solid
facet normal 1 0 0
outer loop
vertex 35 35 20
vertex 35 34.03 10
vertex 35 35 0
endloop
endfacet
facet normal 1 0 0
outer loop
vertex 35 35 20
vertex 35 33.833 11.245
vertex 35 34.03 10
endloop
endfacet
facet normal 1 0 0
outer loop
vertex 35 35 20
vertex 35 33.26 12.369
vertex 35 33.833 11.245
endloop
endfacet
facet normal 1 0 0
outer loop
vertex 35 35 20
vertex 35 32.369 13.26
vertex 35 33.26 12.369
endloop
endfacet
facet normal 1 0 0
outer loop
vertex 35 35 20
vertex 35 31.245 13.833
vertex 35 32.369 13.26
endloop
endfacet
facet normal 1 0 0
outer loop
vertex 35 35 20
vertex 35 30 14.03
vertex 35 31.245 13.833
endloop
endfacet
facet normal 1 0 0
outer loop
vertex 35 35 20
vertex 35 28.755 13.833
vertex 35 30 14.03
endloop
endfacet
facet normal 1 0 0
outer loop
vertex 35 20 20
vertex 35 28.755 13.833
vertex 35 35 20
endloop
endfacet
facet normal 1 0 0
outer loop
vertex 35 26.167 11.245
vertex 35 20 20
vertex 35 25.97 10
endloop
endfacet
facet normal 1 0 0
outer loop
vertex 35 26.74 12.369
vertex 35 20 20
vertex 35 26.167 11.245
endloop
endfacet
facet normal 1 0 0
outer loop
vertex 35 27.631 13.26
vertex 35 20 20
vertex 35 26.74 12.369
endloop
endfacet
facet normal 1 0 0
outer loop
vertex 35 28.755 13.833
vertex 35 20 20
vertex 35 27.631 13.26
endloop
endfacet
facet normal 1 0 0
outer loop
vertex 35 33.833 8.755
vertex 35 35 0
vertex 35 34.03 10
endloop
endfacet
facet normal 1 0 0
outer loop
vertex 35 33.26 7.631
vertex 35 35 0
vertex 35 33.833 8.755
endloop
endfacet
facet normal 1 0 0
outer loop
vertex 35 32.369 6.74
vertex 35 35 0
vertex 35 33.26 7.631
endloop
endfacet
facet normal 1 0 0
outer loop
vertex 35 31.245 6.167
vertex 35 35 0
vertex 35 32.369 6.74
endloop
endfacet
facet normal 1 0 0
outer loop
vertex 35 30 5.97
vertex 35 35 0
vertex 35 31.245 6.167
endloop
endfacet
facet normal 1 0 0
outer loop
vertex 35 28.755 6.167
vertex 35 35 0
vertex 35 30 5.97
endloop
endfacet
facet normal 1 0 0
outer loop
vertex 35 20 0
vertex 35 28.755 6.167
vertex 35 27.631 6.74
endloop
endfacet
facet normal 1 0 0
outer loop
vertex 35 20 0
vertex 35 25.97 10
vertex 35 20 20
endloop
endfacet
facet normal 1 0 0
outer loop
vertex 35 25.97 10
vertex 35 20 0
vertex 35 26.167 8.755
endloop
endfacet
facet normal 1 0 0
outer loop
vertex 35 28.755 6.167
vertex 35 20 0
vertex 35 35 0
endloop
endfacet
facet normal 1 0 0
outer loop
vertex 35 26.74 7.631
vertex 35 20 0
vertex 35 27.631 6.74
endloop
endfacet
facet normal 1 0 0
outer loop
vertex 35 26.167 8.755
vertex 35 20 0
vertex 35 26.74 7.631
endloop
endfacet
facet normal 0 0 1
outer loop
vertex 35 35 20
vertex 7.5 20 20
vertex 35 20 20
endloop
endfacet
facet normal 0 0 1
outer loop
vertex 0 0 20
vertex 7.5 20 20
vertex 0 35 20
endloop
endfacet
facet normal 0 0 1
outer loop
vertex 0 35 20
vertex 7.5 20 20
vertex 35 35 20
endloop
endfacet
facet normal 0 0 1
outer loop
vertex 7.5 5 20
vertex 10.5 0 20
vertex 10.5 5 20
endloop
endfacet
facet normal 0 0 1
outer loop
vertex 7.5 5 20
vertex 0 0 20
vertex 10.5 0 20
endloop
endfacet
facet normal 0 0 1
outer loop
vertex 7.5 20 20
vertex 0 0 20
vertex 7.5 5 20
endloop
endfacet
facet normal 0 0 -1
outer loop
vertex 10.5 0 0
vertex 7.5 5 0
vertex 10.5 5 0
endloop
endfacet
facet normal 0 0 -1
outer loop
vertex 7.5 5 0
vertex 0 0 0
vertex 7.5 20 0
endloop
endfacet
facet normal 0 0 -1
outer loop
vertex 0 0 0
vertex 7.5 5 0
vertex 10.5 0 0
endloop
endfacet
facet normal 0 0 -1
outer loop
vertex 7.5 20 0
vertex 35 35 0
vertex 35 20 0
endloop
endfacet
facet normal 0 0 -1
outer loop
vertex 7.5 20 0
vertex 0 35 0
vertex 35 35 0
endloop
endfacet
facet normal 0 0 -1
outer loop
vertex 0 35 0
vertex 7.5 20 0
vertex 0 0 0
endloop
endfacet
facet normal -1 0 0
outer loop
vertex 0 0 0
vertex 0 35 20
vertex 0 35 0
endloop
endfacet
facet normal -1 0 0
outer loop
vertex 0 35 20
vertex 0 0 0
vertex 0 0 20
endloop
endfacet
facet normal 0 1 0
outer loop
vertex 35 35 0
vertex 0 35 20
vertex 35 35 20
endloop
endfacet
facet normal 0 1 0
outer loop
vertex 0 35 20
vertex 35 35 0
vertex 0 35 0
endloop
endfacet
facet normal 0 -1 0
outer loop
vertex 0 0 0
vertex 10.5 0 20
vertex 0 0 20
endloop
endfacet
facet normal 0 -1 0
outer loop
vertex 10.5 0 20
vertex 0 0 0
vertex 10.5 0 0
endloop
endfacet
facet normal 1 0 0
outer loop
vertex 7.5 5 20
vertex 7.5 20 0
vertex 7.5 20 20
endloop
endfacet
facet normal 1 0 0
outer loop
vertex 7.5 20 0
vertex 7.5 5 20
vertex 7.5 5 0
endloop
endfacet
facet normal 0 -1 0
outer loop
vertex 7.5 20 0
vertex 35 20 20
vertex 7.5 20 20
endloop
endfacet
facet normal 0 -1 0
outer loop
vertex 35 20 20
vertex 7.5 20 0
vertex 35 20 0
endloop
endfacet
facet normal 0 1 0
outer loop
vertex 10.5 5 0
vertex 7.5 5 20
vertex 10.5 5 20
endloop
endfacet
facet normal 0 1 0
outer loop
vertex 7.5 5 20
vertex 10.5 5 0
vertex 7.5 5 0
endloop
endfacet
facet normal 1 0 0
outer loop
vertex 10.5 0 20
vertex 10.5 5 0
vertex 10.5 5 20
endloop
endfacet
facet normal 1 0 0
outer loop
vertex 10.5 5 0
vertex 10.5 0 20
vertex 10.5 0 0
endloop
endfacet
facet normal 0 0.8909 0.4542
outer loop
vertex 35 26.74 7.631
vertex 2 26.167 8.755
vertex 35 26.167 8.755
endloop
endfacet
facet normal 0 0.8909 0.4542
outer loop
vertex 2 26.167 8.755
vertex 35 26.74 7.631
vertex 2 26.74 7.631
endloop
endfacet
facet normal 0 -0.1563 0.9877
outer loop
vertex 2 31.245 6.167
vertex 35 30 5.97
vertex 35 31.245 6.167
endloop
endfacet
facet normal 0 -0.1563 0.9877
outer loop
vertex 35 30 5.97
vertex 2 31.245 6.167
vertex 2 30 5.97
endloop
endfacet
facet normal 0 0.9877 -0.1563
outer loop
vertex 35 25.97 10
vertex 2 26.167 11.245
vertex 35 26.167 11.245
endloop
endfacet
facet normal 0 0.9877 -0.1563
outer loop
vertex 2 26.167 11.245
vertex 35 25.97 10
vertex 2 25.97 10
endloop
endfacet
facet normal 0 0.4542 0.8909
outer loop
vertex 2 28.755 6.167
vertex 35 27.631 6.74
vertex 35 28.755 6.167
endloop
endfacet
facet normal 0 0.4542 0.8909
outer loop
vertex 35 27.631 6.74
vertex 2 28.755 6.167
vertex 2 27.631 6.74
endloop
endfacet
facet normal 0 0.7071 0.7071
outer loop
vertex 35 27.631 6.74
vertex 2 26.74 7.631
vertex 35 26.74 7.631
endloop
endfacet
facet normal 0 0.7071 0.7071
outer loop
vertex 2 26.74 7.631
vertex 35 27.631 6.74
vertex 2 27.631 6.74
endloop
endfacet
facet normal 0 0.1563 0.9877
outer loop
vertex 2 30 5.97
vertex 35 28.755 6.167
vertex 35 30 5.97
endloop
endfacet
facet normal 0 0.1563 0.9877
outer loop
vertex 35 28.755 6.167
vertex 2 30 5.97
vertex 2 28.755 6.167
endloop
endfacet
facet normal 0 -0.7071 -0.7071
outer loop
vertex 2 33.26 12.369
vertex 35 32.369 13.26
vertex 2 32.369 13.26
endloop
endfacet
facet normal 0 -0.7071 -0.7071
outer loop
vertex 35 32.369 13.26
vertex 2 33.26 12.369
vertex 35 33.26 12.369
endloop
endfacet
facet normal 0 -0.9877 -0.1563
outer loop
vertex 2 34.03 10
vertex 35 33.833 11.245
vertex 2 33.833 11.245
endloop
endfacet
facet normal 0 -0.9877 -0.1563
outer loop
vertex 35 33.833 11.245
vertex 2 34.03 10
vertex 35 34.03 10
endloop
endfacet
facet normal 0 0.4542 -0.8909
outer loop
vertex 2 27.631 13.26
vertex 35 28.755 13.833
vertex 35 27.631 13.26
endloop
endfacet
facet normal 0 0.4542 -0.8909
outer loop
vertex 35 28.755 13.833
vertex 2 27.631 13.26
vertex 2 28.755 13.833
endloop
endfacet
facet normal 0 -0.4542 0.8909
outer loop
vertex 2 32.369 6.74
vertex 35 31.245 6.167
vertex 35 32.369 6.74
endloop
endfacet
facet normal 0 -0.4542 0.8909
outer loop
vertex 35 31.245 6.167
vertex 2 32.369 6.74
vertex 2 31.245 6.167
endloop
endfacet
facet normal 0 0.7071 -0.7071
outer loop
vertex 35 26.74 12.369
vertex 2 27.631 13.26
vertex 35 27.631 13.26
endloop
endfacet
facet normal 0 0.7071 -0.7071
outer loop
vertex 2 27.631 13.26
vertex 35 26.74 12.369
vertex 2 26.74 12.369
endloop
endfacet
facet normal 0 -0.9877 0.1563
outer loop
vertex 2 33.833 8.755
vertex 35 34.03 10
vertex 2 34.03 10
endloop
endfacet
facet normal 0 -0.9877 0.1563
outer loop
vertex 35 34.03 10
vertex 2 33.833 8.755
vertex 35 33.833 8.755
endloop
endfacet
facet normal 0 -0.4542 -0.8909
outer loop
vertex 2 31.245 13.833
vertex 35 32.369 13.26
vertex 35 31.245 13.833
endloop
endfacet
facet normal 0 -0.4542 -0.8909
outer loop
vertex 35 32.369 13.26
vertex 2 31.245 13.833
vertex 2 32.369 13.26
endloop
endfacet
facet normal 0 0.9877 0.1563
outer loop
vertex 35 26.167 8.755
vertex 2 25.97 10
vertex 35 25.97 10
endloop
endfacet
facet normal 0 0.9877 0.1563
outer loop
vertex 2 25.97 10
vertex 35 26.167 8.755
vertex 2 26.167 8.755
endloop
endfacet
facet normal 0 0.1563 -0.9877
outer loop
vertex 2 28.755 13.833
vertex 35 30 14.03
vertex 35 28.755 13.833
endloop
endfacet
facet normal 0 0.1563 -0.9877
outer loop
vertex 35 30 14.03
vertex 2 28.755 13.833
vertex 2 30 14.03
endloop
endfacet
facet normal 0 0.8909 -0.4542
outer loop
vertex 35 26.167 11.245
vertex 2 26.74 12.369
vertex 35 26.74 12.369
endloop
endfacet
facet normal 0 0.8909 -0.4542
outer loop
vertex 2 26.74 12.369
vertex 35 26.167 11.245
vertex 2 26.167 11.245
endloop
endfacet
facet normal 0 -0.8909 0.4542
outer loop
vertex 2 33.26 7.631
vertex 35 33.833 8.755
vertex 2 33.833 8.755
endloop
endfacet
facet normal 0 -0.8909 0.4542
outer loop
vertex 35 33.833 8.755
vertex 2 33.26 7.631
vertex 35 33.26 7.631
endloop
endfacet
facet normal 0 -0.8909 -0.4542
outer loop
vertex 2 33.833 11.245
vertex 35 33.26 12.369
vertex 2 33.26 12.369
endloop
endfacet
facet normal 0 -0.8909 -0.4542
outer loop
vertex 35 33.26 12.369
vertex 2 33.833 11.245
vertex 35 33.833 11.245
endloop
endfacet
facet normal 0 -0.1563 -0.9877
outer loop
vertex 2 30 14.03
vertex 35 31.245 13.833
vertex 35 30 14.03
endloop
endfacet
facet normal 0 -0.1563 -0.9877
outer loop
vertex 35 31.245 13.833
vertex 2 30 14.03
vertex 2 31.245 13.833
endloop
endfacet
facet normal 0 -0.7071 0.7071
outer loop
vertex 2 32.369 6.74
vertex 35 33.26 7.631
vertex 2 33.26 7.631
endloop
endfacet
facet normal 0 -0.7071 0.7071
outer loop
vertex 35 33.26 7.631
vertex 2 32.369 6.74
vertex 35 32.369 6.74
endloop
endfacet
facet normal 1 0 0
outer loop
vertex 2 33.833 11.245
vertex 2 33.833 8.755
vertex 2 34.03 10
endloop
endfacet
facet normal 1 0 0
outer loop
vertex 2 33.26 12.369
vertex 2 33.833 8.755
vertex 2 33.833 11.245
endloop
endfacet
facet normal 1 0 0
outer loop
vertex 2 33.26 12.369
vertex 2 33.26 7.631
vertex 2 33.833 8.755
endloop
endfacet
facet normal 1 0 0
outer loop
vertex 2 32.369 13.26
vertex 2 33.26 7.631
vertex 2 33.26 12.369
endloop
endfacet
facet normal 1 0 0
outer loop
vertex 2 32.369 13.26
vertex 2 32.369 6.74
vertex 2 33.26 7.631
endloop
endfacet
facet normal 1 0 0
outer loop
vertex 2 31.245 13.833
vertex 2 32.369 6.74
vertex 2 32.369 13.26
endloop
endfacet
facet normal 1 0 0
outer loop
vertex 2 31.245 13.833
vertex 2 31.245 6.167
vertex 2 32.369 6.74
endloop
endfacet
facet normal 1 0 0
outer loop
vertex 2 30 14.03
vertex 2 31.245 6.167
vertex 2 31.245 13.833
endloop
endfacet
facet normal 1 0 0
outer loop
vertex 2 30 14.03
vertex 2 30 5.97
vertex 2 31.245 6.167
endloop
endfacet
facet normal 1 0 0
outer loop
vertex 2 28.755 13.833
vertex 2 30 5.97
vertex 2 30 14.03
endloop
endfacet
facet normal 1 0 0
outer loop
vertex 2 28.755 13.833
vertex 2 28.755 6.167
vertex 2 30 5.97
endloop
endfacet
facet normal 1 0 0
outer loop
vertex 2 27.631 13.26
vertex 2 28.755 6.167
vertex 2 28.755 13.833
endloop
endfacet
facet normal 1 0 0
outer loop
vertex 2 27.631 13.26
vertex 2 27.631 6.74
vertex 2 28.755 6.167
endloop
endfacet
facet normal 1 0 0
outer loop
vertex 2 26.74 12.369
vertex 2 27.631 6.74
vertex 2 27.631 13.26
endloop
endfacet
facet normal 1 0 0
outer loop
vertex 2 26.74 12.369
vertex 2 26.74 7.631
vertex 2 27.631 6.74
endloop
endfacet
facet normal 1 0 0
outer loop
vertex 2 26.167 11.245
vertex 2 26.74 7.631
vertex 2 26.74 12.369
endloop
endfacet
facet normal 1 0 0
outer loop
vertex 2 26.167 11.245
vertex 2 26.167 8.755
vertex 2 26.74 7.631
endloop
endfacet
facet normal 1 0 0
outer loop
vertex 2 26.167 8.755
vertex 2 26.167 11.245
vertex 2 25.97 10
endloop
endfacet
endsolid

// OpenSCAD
cd = 35;
ce = 20;
difference(){
cube([cd,cd,ce]);
translate([(cd-ce)/2,5,0]) cube([cd,cd-20,ce]);

translate([(cd-ce)/2+3,0,0]) cube([cd,cd-20,ce]);

translate([2,cd-5,ce/2]) rotate([0,90,0])#cylinder(r=4.03,h=40,$fn=20);
}
